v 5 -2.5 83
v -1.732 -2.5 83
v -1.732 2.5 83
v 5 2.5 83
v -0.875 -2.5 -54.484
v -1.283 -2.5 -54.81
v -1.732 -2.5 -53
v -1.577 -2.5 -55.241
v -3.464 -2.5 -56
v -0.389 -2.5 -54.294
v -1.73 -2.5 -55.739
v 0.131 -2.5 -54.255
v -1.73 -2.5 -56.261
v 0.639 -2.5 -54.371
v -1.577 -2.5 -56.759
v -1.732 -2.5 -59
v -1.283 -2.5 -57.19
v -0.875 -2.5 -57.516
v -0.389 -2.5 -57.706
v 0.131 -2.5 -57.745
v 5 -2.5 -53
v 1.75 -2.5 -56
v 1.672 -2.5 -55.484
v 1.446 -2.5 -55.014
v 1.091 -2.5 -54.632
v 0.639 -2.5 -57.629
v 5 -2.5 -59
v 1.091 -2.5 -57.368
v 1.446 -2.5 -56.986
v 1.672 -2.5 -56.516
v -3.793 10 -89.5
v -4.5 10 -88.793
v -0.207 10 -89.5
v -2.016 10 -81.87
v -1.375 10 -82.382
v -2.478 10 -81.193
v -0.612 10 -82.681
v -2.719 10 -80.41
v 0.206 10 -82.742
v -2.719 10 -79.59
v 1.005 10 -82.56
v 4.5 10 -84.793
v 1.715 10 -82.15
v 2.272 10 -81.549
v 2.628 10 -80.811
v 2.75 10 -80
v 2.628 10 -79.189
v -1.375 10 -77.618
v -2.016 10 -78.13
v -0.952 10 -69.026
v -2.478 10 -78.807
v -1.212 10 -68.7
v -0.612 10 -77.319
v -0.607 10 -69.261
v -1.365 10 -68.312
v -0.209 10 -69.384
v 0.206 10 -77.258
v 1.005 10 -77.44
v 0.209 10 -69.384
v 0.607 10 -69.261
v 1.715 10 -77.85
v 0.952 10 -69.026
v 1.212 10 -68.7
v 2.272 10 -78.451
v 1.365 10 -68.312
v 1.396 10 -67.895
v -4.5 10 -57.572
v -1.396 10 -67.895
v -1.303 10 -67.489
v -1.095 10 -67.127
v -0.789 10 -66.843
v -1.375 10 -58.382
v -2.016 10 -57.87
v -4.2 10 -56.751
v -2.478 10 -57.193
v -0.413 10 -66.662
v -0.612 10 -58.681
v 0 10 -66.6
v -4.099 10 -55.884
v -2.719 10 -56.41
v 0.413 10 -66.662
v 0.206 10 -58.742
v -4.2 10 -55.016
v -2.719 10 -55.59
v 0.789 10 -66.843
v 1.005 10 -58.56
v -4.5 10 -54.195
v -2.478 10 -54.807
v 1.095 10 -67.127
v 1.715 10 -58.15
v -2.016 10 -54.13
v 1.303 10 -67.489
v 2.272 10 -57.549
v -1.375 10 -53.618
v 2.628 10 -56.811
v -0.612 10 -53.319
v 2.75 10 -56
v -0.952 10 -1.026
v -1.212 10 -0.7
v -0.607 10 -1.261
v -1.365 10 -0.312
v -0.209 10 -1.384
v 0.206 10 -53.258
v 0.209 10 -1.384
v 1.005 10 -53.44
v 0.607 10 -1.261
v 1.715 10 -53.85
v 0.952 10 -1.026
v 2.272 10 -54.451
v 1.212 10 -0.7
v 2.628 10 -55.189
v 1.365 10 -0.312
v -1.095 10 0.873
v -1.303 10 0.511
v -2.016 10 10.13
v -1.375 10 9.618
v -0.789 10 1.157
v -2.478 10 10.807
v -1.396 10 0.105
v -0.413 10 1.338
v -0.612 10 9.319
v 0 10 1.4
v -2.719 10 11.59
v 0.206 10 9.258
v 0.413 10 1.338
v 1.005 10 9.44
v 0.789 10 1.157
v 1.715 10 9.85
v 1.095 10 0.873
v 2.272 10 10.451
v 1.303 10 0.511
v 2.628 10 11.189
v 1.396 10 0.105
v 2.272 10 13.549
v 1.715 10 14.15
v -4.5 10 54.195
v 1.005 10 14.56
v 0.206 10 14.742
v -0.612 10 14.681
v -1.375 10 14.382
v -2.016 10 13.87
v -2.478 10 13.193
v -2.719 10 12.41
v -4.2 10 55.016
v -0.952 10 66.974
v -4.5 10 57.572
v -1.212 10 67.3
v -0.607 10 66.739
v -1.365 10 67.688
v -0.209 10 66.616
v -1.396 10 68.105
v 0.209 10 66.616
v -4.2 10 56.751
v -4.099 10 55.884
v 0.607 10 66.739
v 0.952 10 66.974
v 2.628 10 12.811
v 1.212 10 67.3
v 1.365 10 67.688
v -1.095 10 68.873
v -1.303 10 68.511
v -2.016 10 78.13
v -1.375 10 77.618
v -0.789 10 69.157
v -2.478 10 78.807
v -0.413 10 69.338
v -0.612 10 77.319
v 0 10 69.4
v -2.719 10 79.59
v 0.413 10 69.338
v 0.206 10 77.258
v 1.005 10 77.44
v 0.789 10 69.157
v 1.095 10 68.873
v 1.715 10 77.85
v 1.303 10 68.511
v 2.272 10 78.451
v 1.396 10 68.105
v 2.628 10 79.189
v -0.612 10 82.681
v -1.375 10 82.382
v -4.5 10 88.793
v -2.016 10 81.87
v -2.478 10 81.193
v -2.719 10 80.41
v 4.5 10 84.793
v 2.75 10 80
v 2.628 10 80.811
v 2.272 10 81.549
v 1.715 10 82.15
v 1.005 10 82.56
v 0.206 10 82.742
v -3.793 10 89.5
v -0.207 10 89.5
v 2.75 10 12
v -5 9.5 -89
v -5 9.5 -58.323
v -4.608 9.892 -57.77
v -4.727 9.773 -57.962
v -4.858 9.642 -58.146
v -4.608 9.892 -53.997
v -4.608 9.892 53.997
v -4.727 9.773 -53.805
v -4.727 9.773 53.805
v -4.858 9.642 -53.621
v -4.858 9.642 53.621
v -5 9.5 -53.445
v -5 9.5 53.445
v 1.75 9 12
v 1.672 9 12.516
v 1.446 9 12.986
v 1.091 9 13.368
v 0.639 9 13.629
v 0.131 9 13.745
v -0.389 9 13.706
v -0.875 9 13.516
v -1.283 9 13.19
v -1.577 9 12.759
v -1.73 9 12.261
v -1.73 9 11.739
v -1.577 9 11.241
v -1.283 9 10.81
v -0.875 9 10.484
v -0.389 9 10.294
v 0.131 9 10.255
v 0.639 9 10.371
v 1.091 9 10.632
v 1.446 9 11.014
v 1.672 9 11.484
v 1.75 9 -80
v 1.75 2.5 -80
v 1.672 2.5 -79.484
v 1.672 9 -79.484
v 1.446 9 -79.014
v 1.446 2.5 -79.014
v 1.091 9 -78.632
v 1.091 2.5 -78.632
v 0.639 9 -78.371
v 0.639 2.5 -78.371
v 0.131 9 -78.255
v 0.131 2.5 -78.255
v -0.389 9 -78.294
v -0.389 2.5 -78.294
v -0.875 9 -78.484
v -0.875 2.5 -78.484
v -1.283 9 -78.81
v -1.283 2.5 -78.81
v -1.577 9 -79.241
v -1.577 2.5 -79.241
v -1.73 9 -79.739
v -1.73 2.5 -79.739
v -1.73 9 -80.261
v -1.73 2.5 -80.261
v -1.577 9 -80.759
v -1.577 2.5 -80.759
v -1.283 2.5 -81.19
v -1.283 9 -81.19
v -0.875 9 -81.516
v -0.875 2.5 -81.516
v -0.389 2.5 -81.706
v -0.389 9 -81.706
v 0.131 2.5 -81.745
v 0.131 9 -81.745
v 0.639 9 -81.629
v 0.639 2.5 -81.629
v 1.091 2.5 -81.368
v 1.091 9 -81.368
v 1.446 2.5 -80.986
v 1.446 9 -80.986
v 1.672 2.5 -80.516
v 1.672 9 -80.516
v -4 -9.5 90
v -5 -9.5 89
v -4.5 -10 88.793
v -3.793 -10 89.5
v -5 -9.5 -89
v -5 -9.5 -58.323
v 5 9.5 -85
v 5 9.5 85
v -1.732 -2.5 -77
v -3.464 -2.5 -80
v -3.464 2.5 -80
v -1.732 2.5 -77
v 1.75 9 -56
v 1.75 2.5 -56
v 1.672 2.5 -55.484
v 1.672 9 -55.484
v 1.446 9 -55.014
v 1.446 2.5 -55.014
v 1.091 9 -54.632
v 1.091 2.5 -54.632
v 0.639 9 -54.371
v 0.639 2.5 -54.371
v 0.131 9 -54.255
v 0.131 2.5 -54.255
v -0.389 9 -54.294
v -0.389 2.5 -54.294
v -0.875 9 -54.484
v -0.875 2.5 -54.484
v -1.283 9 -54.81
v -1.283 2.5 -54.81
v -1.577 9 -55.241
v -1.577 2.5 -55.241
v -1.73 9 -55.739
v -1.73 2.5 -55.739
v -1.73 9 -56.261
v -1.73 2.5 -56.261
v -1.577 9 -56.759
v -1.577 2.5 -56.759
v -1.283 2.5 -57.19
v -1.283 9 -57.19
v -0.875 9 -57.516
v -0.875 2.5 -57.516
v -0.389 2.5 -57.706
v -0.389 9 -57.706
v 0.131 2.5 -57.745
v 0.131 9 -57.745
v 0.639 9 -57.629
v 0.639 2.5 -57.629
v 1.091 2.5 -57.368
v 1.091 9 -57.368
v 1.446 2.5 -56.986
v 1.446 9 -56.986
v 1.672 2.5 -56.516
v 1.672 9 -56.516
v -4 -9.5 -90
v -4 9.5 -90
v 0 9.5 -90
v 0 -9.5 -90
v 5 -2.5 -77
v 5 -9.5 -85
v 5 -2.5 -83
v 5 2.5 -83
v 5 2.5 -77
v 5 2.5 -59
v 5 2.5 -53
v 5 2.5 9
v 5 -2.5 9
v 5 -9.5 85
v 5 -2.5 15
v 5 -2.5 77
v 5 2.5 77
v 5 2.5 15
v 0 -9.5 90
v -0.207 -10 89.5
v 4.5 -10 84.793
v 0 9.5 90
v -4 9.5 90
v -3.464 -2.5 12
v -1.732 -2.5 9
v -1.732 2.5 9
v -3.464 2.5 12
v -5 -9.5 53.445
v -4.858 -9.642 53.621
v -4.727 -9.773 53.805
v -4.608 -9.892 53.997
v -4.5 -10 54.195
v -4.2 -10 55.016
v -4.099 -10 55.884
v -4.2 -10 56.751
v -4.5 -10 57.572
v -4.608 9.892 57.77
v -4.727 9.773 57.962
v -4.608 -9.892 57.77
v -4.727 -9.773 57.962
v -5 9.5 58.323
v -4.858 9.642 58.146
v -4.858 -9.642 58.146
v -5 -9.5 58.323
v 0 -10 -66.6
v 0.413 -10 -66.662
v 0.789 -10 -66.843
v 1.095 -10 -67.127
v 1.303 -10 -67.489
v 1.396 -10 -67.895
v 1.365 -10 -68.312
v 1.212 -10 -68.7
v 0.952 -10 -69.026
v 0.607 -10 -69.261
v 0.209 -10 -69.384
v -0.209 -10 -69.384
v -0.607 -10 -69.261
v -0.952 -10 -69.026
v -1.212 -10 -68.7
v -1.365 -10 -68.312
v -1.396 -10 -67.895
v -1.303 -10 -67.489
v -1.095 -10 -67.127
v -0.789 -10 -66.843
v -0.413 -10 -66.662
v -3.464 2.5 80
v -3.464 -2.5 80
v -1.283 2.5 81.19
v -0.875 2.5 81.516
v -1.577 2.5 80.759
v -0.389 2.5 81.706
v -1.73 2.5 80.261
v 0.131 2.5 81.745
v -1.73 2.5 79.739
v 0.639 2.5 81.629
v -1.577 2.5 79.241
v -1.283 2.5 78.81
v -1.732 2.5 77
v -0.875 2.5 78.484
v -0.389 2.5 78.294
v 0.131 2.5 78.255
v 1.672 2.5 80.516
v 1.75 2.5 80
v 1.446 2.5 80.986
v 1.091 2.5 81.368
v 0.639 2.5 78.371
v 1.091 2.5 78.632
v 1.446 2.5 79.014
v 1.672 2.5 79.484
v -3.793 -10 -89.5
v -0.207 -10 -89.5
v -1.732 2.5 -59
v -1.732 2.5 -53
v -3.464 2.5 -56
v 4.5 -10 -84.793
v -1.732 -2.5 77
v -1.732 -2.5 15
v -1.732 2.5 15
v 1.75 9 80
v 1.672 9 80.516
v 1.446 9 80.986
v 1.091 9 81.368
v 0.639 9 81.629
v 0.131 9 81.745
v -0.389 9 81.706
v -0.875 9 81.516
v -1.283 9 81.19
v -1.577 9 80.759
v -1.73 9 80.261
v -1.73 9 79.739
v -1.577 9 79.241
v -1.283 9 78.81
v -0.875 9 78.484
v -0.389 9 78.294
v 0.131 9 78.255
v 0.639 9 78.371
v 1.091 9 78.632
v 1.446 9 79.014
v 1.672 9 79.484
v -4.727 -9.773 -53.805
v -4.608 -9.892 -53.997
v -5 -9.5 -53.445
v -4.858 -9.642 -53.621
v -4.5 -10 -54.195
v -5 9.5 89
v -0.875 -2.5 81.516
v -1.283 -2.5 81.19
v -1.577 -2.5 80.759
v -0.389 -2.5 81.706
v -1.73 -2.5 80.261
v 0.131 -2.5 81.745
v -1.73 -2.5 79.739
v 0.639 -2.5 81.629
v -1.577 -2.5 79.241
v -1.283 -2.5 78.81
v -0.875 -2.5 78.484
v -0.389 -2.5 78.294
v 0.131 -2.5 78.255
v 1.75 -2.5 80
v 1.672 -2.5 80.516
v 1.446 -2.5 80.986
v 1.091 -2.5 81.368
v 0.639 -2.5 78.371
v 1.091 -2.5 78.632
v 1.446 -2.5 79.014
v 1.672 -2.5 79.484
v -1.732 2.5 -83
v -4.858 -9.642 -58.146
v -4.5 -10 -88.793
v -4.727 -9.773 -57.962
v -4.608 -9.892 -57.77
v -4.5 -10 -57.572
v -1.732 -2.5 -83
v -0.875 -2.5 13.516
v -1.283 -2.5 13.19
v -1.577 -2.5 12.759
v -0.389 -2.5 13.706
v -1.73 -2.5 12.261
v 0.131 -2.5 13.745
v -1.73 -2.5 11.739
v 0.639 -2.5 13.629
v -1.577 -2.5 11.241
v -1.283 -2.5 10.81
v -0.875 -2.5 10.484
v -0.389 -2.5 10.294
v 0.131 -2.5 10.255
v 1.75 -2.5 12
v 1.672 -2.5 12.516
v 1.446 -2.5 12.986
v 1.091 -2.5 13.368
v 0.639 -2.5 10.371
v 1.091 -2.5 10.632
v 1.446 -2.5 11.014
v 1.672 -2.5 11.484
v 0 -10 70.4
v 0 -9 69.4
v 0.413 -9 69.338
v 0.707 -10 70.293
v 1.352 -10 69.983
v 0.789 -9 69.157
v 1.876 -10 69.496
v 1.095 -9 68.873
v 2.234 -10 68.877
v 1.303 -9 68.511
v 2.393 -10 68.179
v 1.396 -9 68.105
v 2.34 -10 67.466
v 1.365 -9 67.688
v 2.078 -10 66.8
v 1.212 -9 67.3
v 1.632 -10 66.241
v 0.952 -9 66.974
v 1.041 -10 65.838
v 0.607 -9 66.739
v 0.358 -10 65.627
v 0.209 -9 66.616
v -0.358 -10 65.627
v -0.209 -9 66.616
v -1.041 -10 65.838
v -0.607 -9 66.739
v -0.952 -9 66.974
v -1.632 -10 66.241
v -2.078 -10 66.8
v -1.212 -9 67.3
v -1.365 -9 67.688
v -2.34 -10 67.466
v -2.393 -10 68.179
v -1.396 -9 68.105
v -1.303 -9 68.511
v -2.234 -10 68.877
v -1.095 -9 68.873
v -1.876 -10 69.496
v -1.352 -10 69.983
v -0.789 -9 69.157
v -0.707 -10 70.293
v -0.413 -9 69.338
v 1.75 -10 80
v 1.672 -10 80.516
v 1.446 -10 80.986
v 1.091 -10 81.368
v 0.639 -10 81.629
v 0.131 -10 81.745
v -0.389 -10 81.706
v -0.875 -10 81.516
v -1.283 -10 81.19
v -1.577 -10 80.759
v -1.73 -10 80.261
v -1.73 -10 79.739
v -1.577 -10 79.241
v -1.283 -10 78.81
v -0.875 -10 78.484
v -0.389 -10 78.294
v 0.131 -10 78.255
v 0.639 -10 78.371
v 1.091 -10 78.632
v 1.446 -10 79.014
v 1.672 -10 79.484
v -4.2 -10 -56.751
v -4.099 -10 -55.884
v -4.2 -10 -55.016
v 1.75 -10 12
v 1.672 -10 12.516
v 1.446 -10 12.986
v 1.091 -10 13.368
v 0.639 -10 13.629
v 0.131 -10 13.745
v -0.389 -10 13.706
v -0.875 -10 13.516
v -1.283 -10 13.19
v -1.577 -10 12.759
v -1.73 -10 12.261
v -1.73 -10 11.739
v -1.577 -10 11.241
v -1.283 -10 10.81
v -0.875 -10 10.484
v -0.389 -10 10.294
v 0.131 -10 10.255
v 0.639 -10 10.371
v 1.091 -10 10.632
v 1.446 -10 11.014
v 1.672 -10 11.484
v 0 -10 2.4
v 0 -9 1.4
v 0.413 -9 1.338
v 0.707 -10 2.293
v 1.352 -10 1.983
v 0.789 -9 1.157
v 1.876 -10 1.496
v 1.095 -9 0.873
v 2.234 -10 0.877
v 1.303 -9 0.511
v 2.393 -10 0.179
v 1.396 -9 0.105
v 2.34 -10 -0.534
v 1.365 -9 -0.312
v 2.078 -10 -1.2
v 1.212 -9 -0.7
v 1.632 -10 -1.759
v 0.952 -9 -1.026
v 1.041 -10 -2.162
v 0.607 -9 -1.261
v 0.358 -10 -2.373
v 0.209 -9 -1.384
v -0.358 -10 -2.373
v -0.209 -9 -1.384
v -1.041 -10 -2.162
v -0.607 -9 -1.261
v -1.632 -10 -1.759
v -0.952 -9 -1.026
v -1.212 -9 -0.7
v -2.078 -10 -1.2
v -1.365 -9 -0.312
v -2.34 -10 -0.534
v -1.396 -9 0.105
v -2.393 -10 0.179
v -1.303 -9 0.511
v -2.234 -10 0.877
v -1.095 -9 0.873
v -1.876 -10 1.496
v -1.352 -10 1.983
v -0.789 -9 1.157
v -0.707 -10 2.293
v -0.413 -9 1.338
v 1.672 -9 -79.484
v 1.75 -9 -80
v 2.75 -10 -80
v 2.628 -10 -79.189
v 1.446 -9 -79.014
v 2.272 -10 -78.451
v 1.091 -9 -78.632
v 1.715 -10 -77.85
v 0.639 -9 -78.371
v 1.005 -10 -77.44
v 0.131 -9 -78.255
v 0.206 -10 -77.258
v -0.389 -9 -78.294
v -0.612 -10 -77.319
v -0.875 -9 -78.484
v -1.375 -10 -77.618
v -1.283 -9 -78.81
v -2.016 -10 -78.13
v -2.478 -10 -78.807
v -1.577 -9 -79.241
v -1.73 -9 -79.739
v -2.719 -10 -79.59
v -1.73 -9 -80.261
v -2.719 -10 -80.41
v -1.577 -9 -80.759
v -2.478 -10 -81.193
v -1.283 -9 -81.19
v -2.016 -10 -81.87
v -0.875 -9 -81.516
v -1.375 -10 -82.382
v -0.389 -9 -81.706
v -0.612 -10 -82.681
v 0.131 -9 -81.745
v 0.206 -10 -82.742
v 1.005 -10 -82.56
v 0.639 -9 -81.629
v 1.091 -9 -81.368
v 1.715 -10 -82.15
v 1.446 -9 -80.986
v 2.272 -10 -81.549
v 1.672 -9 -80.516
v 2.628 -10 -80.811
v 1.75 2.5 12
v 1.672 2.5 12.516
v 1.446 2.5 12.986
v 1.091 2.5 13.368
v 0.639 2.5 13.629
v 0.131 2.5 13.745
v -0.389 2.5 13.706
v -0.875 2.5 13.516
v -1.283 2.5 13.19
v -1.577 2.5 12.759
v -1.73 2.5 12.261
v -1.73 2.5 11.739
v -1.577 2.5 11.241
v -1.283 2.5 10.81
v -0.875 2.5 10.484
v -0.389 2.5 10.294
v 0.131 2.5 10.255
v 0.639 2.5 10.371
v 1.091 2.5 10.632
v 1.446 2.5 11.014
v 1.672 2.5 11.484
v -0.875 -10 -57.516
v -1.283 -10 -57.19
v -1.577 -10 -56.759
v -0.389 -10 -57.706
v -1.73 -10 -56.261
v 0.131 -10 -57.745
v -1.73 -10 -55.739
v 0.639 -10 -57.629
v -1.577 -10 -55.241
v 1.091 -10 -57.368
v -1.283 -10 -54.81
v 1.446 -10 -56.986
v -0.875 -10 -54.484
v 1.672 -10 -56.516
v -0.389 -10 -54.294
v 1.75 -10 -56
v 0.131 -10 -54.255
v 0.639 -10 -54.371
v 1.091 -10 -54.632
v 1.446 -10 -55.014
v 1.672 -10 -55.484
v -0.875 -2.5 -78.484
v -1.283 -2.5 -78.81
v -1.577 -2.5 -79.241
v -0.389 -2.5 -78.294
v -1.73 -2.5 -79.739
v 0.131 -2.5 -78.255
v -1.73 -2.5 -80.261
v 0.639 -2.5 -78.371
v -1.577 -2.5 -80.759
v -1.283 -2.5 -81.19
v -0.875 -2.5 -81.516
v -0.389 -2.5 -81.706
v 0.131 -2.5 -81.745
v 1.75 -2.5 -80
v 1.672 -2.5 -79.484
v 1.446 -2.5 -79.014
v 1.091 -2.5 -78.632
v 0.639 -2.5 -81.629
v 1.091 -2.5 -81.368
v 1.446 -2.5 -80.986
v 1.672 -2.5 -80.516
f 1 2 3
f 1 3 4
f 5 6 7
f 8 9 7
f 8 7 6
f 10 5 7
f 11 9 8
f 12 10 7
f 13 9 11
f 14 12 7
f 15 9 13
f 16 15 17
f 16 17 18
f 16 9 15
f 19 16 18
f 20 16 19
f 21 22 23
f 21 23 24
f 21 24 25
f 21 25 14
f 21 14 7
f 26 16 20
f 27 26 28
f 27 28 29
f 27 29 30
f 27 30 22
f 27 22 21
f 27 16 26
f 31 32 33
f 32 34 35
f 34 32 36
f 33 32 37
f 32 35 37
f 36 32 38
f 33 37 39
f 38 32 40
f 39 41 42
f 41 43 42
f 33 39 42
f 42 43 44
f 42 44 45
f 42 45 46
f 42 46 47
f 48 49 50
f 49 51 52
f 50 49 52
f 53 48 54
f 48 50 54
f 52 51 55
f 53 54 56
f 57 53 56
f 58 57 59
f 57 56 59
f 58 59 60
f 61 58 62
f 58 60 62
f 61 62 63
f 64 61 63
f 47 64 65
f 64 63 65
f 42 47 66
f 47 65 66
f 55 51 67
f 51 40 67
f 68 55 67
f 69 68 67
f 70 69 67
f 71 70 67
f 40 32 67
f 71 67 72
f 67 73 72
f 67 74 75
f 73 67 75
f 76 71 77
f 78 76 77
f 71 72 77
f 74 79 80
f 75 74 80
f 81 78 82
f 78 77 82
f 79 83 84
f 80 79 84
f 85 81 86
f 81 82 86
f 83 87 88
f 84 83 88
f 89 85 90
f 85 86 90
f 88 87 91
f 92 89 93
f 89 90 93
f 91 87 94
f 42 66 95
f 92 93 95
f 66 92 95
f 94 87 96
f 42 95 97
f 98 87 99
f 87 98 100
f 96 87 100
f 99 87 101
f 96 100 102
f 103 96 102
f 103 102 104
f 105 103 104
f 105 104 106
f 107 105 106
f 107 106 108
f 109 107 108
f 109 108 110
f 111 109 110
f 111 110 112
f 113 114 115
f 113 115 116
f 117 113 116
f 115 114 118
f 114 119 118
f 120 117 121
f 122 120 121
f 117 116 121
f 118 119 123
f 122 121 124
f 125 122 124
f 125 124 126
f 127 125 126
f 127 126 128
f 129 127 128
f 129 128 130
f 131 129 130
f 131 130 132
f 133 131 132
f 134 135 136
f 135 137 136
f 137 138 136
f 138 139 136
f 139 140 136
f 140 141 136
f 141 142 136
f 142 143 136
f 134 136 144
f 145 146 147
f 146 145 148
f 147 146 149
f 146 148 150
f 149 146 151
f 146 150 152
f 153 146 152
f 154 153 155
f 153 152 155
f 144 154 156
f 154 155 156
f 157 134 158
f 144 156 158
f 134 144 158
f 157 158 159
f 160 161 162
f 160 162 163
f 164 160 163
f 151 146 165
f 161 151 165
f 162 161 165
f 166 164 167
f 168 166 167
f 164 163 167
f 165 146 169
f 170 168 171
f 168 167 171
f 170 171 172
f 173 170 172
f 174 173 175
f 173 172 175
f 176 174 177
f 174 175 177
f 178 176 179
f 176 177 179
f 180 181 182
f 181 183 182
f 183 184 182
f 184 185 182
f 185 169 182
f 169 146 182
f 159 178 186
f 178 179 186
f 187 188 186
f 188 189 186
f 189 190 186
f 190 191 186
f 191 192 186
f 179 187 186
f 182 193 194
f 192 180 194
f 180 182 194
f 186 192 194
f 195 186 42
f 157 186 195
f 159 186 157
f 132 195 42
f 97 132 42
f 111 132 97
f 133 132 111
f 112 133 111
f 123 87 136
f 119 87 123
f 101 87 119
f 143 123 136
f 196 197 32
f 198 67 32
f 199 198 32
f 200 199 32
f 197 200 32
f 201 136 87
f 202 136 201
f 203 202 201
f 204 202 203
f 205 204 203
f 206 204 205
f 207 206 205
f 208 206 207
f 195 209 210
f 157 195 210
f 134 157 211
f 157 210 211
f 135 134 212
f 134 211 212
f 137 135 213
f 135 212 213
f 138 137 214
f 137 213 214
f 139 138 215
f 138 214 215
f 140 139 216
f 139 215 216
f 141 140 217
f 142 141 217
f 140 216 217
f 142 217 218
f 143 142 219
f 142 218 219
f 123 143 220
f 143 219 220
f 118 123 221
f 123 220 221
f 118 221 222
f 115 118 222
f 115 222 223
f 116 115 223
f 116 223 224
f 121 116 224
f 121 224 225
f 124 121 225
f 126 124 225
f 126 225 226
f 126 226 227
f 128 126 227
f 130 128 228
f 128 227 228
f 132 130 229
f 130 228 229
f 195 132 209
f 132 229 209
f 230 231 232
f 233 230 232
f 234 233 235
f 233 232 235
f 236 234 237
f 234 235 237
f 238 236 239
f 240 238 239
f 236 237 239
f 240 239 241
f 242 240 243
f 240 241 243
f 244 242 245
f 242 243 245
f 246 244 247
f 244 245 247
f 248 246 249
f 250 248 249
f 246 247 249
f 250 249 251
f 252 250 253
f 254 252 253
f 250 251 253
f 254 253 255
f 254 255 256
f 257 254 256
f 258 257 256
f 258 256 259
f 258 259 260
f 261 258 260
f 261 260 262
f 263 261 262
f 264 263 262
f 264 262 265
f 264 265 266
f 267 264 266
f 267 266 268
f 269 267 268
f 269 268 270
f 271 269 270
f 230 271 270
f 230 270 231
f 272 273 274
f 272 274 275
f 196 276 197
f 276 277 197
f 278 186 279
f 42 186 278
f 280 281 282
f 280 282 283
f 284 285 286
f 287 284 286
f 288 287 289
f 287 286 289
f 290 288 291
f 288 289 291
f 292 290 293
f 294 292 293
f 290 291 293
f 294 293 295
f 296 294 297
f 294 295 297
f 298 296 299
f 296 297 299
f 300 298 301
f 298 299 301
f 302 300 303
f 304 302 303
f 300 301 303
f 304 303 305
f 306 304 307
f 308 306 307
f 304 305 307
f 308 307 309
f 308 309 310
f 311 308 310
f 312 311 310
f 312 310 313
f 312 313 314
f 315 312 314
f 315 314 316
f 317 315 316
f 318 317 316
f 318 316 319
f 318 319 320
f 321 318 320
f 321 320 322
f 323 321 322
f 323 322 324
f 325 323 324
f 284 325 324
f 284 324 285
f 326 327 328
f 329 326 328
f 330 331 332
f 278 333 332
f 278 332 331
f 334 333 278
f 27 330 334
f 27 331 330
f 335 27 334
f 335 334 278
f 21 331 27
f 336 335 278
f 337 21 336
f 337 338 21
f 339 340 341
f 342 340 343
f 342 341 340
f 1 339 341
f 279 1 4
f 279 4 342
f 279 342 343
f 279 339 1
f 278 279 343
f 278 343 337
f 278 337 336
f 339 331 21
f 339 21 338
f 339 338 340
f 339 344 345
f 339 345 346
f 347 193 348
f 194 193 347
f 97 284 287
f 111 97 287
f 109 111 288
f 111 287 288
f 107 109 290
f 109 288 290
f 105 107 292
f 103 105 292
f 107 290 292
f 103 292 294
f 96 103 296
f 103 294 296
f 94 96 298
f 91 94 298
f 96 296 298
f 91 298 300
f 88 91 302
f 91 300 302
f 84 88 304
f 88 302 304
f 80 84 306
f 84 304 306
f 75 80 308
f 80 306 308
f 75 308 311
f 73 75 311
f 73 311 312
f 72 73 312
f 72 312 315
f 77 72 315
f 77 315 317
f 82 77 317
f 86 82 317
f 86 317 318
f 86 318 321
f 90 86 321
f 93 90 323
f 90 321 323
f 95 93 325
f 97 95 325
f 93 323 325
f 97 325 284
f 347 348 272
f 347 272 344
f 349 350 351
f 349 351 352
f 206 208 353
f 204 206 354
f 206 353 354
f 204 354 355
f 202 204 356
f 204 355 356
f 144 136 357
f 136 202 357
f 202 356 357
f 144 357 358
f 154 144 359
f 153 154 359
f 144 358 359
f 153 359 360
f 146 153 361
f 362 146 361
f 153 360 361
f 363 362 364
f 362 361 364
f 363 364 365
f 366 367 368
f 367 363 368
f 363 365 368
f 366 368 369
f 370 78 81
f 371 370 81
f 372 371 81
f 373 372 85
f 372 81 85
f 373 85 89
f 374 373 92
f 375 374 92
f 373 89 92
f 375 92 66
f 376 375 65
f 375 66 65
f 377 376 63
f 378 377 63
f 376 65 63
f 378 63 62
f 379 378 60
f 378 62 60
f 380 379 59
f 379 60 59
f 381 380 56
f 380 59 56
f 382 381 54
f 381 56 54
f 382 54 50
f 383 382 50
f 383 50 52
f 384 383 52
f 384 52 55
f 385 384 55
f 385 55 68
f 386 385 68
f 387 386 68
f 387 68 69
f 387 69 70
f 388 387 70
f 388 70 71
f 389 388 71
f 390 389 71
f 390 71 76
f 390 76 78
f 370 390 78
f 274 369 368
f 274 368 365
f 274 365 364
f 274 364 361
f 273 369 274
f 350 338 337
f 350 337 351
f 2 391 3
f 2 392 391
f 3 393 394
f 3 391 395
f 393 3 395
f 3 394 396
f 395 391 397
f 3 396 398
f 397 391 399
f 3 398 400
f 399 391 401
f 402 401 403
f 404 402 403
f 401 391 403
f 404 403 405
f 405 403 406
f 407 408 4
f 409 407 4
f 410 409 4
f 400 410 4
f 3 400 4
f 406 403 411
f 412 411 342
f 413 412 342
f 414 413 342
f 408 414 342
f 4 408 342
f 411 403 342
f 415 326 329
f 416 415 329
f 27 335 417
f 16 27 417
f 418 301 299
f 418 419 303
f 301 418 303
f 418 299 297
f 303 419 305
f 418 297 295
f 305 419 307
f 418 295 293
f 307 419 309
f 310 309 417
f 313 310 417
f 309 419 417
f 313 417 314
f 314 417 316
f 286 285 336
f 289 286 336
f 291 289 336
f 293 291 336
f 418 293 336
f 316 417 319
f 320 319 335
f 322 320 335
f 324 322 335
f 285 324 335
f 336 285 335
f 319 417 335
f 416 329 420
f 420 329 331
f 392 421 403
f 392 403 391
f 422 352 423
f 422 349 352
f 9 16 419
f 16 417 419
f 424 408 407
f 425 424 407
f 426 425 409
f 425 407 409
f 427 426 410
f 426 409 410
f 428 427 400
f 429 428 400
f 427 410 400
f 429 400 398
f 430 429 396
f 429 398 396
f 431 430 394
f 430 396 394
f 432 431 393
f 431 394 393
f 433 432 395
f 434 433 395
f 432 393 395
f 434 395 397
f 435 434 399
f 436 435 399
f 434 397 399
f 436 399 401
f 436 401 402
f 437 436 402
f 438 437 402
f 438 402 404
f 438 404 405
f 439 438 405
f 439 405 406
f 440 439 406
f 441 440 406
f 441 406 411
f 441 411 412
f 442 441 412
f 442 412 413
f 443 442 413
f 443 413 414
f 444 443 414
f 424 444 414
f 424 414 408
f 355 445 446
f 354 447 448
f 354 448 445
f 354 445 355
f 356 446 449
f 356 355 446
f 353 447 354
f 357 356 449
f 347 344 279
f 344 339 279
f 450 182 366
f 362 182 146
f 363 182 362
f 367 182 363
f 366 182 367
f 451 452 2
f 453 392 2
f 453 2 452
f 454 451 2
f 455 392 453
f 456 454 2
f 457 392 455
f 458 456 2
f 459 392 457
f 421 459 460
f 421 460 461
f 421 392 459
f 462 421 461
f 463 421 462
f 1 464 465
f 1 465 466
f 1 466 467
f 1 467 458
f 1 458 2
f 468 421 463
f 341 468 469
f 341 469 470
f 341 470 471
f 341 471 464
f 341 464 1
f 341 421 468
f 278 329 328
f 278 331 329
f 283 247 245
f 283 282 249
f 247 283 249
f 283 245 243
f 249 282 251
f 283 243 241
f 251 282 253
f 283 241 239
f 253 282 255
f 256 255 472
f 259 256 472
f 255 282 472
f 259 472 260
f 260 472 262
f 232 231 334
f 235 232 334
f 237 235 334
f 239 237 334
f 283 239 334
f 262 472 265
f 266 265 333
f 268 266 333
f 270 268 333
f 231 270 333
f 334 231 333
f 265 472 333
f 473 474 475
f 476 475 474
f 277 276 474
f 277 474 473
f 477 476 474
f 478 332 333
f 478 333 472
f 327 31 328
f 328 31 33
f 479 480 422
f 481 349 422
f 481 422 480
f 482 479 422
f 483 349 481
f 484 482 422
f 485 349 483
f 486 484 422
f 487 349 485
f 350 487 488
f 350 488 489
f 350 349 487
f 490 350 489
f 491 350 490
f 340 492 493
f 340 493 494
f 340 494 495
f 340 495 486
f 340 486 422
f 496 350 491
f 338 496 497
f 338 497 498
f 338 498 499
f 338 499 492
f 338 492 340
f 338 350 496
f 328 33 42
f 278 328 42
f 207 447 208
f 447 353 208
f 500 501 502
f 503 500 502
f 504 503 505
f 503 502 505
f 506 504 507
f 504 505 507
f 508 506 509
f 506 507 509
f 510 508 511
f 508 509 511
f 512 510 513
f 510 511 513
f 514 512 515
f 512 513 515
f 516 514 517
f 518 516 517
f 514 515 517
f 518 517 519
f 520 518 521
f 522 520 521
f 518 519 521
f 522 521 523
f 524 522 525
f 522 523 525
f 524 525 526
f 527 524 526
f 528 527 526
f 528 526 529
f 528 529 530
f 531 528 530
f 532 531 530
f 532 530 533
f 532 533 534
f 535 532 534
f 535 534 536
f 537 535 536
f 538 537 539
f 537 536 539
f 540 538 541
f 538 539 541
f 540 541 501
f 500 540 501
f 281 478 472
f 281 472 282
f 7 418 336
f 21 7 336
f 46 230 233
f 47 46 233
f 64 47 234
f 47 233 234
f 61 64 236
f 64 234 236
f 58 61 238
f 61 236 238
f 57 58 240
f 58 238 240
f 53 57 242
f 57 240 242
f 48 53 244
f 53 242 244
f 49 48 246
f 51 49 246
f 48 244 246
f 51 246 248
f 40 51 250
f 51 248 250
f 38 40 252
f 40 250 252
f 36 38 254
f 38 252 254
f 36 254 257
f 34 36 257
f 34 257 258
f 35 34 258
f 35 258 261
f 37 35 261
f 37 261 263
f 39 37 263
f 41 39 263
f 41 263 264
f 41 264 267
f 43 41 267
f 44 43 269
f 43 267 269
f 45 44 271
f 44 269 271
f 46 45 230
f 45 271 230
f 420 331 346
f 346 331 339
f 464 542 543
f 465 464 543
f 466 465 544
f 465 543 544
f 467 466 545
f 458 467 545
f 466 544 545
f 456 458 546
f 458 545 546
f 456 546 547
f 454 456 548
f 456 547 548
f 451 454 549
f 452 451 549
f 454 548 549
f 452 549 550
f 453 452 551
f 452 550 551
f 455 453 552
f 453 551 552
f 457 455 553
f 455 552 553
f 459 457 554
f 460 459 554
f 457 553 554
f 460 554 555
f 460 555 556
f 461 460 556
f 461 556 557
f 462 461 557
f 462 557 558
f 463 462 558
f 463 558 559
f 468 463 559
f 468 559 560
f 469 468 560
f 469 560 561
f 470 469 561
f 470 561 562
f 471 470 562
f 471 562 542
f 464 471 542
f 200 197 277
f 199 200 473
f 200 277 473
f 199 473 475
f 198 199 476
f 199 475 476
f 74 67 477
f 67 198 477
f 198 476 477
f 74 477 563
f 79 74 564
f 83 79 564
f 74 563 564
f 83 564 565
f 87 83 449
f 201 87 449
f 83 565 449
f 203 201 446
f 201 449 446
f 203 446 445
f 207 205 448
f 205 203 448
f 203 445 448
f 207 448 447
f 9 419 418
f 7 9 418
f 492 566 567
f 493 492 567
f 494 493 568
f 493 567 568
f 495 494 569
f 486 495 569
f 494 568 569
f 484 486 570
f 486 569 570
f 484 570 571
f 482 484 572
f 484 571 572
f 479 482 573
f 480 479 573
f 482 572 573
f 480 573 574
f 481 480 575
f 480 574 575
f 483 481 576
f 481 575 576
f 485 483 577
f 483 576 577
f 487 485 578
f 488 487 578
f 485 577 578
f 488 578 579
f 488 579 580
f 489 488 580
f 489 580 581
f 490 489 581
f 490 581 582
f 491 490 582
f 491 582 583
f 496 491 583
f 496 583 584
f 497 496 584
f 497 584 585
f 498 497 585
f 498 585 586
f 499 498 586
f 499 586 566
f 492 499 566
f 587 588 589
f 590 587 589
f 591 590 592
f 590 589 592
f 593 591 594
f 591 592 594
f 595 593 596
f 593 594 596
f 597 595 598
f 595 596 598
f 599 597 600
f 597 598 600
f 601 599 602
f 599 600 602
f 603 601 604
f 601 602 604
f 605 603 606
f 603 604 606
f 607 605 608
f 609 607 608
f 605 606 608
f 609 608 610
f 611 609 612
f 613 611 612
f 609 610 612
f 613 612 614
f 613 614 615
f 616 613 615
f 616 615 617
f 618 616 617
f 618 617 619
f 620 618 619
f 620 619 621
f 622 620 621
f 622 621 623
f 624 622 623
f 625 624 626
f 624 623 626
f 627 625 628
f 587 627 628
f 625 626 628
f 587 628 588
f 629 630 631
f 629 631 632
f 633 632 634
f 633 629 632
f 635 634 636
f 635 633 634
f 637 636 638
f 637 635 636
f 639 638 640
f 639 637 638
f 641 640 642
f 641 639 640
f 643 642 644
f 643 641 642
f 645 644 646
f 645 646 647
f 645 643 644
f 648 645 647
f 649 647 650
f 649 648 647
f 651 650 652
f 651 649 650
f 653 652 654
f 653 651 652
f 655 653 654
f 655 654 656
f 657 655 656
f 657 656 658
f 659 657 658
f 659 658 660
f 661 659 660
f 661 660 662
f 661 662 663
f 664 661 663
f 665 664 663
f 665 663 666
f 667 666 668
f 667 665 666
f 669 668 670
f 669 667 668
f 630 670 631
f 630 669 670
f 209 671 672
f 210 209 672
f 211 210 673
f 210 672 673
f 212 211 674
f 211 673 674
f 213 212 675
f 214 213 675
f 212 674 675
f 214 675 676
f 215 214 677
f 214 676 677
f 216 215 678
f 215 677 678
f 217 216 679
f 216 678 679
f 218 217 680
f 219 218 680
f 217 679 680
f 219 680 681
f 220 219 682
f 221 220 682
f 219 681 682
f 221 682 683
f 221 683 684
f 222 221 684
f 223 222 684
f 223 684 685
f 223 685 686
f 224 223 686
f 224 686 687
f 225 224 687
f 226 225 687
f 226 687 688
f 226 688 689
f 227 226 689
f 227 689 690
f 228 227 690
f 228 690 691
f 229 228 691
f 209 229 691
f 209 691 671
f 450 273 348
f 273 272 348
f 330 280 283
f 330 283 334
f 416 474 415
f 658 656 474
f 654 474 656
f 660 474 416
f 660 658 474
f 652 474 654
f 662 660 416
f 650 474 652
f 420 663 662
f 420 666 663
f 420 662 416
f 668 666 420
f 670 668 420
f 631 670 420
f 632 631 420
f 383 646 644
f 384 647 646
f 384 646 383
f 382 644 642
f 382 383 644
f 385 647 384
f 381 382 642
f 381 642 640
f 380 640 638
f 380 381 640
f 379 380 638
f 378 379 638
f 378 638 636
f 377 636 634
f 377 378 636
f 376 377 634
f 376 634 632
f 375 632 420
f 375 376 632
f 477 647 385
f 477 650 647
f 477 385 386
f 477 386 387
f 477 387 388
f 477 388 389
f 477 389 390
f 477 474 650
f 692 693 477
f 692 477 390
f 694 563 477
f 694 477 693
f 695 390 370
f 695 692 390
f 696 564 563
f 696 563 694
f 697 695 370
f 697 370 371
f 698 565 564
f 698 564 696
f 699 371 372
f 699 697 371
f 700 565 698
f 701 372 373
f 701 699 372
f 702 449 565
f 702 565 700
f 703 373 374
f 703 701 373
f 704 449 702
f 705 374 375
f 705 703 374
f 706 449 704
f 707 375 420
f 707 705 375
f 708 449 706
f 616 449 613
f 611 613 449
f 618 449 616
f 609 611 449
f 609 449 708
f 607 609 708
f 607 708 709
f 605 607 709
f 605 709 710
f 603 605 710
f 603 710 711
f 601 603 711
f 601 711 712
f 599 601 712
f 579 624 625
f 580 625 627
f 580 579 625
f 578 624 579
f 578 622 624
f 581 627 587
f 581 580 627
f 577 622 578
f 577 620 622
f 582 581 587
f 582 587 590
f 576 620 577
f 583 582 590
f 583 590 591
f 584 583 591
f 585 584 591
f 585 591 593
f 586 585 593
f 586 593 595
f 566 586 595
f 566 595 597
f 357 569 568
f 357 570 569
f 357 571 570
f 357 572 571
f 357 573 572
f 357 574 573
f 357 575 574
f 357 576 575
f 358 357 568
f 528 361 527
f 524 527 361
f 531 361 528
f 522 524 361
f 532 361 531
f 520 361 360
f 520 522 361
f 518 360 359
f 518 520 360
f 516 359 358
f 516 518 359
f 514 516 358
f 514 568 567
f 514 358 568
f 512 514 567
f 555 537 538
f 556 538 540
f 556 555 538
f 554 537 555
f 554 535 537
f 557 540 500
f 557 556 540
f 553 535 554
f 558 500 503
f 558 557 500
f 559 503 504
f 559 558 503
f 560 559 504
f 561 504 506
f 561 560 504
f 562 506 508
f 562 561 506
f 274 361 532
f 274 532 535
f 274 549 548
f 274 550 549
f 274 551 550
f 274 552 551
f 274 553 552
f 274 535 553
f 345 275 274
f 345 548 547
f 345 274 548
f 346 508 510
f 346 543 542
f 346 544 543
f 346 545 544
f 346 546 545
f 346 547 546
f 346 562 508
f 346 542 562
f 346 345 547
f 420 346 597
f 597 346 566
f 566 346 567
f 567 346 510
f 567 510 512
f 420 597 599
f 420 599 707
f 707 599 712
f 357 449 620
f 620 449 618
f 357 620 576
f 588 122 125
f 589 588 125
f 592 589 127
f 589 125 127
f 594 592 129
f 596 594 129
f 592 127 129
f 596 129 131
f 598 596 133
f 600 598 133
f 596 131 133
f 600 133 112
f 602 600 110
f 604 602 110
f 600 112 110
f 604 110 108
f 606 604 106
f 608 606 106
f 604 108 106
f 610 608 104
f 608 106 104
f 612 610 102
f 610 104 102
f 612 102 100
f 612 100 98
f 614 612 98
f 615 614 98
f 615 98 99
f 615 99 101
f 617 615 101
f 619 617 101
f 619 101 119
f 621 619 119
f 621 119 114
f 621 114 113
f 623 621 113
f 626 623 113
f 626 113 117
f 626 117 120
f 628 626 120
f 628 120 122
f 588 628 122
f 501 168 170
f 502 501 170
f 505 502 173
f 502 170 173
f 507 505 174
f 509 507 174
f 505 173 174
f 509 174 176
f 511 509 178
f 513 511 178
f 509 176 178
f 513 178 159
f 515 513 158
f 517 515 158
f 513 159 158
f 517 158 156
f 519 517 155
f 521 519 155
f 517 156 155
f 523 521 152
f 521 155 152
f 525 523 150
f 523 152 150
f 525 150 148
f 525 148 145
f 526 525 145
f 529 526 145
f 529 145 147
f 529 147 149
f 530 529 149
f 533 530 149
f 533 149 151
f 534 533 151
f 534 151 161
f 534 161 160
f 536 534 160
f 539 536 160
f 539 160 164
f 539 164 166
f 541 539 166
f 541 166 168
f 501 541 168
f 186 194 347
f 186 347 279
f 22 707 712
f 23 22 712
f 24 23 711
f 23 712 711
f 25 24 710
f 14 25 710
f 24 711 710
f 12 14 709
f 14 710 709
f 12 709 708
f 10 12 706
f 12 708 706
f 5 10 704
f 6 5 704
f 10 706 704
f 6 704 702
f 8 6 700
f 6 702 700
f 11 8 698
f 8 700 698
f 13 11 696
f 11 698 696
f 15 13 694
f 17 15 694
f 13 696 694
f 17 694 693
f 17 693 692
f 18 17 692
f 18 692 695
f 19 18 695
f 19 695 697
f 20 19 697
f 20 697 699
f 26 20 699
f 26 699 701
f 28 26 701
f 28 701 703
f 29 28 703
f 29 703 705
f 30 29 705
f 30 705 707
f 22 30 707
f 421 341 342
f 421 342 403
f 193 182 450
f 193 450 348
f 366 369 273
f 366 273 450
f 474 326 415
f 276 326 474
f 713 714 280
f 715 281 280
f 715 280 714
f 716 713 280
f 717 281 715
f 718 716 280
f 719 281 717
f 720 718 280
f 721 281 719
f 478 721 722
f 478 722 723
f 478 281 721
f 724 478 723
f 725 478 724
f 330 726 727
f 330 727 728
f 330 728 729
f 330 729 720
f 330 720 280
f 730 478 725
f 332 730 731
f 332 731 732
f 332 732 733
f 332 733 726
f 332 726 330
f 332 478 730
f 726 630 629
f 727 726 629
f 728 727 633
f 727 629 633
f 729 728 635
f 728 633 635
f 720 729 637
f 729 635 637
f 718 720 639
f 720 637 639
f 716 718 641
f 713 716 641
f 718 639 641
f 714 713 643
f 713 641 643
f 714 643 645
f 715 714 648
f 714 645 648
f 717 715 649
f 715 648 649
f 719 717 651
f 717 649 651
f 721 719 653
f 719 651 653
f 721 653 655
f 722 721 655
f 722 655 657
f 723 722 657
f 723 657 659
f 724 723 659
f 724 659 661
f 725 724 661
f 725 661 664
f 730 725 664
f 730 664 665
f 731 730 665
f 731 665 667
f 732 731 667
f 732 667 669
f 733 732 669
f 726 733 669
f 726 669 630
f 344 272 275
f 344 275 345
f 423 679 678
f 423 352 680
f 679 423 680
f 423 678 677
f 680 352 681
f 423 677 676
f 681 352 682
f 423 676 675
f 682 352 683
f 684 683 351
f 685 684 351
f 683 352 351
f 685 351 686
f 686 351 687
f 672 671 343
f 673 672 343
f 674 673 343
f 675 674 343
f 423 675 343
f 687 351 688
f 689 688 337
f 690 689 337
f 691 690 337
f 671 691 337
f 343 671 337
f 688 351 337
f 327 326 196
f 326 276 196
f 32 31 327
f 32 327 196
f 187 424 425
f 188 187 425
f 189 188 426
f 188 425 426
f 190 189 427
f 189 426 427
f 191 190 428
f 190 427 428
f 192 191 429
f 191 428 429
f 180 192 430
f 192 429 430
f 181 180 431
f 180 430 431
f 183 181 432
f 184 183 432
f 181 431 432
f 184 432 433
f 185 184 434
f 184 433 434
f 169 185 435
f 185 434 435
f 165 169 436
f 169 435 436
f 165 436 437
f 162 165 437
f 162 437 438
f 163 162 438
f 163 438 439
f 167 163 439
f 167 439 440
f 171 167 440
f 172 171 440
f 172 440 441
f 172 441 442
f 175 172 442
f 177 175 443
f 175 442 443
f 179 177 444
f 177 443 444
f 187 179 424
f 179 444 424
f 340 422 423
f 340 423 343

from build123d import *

# Parameters (mm, degrees)
SKETCH1_W           = 10
SKETCH1_H           = 20
BOSS_EXTRUDE1_DEPTH = 90
SKETCH6_R           = 1.75
CUT_EXTRUDE4_DEPTH  = 93.330926563
SKETCH7_R           = 1.4
CUT_EXTRUDE5_DEPTH  = 93.330926563
CUT_EXTRUDE6_START  = -10
CUT_EXTRUDE6_DEPTH  = 2.5
CHAMFER2_SIZE       = 5
CHAMFER3_SIZE       = 1
CHAMFER4_SIZE       = 0.5
CHAMFER5_SIZE       = 0.5
SKETCH10_R          = 3.75
CUT_EXTRUDE7_DEPTH  = 93.330926563


with BuildPart() as part:
    # Sketch1 → Boss-Extrude1 (new, symmetric)
    with BuildSketch(Plane.XY):
        Rectangle(SKETCH1_W, SKETCH1_H)
    extrude(amount=BOSS_EXTRUDE1_DEPTH, both=True)

    # Sketch6 → Cut-Extrude4 (cut, through all)
    with BuildSketch(Plane.XZ.offset(10)):
        with Locations((0, 80)):
            Circle(SKETCH6_R)
        with Locations((0, -80)):
            Circle(SKETCH6_R)
        with Locations((0, 12)):
            Circle(SKETCH6_R)
        with Locations((0, -56)):
            Circle(SKETCH6_R)
    extrude(amount=-CUT_EXTRUDE4_DEPTH, mode=Mode.SUBTRACT)

    # Sketch7 → Cut-Extrude5 (cut, through all)
    with BuildSketch(Plane(origin=(0, 10, 0), x_dir=(1, 0, 0), z_dir=(0, 1, 0))):
        with Locations(Location((0, 68, 0), (0, 0, 270))):
            Circle(SKETCH7_R)
        with Locations(Location((0, 0, 0), (0, 0, 270))):
            Circle(SKETCH7_R)
        with Locations(Location((0, -68, 0), (0, 0, 270))):
            Circle(SKETCH7_R)
    extrude(amount=-CUT_EXTRUDE5_DEPTH, mode=Mode.SUBTRACT)

    # Sketch9 → Cut-Extrude6 (cut, symmetric)
    with BuildSketch(Plane(origin=(0, 10, 0), x_dir=(1, 0, 0), z_dir=(0, 1, 0)).offset(CUT_EXTRUDE6_START)):
        Polygon((1.732050808, -77), (-1.732050808, -77), (-3.464101615, -80), (-1.732050808, -83), (1.732050808, -83), (12.756943772, -83), (12.756943772, -77), align=None)
        Polygon((-3.464101615, 80), (-1.732050808, 77), (1.732050808, 77), (12.756943772, 77), (12.756943772, 83), (1.732050808, 83), (-1.732050808, 83), align=None)
        Polygon((1.732050808, -9), (-1.732050808, -9), (-3.464101615, -12), (-1.732050808, -15), (1.732050808, -15), (12.756943772, -15), (12.756943772, -9), align=None)
        Polygon((1.732050808, 59), (-1.732050808, 59), (-3.464101615, 56), (-1.732050808, 53), (1.732050808, 53), (12.756943772, 53), (12.756943772, 59), align=None)
    extrude(amount=CUT_EXTRUDE6_DEPTH, both=True, mode=Mode.SUBTRACT)

    # Chamfer2
    chamfer2_edges = [part.edges().sort_by_distance(p)[0] for p in [
        (5, 0, 90),
        (5, 0, -90),
    ]]
    chamfer(chamfer2_edges, length=CHAMFER2_SIZE)

    # Chamfer3
    chamfer3_edges = [part.edges().sort_by_distance(p)[0] for p in [
        (-1.75, 10, 80),
        (-1.75, 10, -56),
        (-1.75, 10, 12),
        (-1.75, 10, -80),
        (-1.75, -10, -80),
        (0, -10, -1.4),
        (0, -10, 66.6),
        (-5, 0, 90),
        (-5, 0, -90),
    ]]
    chamfer(chamfer3_edges, length=CHAMFER3_SIZE)

    # Chamfer4
    chamfer4_edges = [part.edges().sort_by_distance(p)[0] for p in [
        (5, -10, 0),
        (2.5, -10, 87.5),
        (2.5, -10, -87.5),
        (-2, -10, -90),
        (-2, -10, 90),
        (-5, -10, 0),
        (-4.5, -10, 89.5),
        (-4.5, -10, -89.5),
    ]]
    chamfer(chamfer4_edges, length=CHAMFER4_SIZE)

    # Chamfer5
    chamfer5_edges = [part.edges().sort_by_distance(p)[0] for p in [
        (5, 10, 0),
        (-2, 10, -90),
        (-2, 10, 90),
        (2.5, 10, 87.5),
        (2.5, 10, -87.5),
        (-5, 10, 0),
        (-4.5, 10, 89.5),
        (-4.5, 10, -89.5),
    ]]
    chamfer(chamfer5_edges, length=CHAMFER5_SIZE)

    # Sketch10 → Cut-Extrude7 (cut, through all)
    with BuildSketch(Plane.XZ.offset(10)):
        with Locations((-7.848531477, -55.883586947)):
            Circle(SKETCH10_R)
        with Locations((-7.848531477, 55.883586947)):
            Circle(SKETCH10_R)
    extrude(amount=-CUT_EXTRUDE7_DEPTH, mode=Mode.SUBTRACT)


solid = part.part
